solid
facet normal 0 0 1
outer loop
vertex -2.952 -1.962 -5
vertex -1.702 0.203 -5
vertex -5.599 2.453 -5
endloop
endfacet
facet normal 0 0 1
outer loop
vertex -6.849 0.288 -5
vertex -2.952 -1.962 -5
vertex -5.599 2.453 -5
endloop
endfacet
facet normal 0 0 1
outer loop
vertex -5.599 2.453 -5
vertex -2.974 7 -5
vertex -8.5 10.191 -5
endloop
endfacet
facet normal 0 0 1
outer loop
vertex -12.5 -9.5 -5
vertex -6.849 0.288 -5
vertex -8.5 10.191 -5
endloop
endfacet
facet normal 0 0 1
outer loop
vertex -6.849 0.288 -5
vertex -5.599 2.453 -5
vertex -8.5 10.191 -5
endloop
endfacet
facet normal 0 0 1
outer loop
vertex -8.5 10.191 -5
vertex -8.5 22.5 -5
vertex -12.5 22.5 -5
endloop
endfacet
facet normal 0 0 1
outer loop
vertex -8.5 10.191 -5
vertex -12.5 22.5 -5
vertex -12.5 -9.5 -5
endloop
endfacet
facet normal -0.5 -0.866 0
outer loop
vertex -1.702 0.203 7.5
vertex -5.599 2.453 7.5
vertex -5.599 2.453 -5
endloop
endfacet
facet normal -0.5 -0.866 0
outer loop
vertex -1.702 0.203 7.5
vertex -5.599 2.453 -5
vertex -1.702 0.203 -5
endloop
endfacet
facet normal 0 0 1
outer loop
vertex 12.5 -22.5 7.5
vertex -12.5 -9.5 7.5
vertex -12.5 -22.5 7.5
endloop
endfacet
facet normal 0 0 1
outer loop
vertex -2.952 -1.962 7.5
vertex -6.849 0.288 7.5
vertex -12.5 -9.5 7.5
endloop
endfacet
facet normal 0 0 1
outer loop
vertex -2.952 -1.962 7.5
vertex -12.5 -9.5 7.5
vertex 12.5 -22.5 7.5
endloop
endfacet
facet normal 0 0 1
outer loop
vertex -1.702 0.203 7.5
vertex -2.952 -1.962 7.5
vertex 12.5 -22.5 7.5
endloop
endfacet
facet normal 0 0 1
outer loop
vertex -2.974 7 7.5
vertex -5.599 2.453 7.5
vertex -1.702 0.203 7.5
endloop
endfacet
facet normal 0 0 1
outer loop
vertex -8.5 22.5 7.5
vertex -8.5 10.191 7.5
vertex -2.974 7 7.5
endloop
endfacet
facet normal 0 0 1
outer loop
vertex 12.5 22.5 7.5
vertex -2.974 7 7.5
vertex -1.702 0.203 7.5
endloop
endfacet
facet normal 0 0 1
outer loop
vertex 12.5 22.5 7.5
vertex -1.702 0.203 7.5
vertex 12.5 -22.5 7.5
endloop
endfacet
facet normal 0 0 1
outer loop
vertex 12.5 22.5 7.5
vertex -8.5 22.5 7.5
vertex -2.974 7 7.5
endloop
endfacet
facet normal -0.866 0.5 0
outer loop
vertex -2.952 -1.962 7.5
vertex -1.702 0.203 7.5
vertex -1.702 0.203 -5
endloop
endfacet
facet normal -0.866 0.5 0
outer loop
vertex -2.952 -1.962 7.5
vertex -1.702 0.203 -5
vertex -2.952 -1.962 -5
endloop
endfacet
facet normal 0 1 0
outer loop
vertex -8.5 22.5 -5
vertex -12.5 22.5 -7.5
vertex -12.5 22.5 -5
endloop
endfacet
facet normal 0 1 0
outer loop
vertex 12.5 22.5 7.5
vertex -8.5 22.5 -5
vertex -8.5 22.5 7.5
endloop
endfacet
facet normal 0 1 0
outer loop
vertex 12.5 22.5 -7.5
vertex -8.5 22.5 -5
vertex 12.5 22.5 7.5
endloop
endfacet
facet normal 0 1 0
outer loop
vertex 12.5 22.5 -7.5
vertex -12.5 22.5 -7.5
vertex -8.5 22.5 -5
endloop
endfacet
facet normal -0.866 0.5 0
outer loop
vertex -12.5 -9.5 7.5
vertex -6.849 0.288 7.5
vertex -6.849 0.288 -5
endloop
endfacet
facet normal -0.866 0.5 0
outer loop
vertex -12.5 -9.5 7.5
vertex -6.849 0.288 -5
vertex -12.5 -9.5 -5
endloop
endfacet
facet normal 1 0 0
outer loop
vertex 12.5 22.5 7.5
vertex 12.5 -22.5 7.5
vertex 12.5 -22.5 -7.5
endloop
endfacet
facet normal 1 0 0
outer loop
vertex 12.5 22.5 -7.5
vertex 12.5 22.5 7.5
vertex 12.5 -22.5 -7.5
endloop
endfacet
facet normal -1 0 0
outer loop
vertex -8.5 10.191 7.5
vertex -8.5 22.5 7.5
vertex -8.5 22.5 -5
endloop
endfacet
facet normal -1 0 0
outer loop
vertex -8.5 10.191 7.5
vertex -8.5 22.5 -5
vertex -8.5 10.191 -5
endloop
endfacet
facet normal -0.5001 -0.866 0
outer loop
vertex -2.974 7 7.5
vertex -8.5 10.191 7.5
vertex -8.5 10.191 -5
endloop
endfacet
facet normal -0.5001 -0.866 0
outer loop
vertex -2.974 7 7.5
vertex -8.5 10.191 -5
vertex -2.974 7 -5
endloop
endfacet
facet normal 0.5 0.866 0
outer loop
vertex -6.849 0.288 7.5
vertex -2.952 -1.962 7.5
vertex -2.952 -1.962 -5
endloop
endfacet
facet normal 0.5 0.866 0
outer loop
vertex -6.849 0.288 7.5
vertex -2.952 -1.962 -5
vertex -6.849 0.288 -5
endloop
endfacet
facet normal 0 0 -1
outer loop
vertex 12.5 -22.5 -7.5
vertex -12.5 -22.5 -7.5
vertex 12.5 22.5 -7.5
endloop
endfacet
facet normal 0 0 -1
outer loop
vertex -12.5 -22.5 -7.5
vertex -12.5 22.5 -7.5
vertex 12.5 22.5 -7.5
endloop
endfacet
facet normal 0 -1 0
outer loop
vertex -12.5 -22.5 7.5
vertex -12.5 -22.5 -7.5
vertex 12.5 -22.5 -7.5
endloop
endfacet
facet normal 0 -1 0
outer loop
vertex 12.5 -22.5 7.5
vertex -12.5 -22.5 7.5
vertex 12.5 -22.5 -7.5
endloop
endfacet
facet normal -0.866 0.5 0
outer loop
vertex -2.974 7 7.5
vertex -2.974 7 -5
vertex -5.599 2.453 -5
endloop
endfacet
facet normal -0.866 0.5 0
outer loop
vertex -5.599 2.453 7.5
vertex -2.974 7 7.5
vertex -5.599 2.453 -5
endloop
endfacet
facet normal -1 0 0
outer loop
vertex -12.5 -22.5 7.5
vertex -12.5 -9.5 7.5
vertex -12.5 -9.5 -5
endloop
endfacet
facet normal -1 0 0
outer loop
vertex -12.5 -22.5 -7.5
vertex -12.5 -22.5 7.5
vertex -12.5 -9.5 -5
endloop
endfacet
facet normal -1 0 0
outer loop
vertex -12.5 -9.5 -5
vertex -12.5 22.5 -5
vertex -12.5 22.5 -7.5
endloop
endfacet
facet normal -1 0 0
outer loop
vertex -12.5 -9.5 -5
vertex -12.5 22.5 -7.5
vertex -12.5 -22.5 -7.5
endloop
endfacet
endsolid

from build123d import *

# Parameters (mm, degrees)
SKETCH1_W           = 25
SKETCH1_H           = 15
BOSS_EXTRUDE2_DEPTH = 22.5
CUT_EXTRUDE2_DEPTH  = 12.5


with BuildPart() as part:
    # Sketch1 → Boss-Extrude2 (new, symmetric)
    with BuildSketch(Plane(origin=(0, 0, 0), x_dir=(1, 0, 0), z_dir=(0, 1, 0))):
        Rectangle(SKETCH1_W, SKETCH1_H)
    extrude(amount=BOSS_EXTRUDE2_DEPTH, both=True)

    # Sketch5 → Cut-Extrude2 (cut)
    with BuildSketch(Plane.XY.offset(7.5)):
        Polygon((-8.5, 10.190598923), (-2.973720558, 7), (-5.598720558, 2.45336663), (-1.701606241, 0.20336663), (-2.951606241, -1.961696879), (-6.848720558, 0.288303121), (-12.5, -9.5), (-12.5, 24.790598923), (-8.5, 24.790598923), align=None)
    extrude(amount=-CUT_EXTRUDE2_DEPTH, mode=Mode.SUBTRACT)


solid = part.part
